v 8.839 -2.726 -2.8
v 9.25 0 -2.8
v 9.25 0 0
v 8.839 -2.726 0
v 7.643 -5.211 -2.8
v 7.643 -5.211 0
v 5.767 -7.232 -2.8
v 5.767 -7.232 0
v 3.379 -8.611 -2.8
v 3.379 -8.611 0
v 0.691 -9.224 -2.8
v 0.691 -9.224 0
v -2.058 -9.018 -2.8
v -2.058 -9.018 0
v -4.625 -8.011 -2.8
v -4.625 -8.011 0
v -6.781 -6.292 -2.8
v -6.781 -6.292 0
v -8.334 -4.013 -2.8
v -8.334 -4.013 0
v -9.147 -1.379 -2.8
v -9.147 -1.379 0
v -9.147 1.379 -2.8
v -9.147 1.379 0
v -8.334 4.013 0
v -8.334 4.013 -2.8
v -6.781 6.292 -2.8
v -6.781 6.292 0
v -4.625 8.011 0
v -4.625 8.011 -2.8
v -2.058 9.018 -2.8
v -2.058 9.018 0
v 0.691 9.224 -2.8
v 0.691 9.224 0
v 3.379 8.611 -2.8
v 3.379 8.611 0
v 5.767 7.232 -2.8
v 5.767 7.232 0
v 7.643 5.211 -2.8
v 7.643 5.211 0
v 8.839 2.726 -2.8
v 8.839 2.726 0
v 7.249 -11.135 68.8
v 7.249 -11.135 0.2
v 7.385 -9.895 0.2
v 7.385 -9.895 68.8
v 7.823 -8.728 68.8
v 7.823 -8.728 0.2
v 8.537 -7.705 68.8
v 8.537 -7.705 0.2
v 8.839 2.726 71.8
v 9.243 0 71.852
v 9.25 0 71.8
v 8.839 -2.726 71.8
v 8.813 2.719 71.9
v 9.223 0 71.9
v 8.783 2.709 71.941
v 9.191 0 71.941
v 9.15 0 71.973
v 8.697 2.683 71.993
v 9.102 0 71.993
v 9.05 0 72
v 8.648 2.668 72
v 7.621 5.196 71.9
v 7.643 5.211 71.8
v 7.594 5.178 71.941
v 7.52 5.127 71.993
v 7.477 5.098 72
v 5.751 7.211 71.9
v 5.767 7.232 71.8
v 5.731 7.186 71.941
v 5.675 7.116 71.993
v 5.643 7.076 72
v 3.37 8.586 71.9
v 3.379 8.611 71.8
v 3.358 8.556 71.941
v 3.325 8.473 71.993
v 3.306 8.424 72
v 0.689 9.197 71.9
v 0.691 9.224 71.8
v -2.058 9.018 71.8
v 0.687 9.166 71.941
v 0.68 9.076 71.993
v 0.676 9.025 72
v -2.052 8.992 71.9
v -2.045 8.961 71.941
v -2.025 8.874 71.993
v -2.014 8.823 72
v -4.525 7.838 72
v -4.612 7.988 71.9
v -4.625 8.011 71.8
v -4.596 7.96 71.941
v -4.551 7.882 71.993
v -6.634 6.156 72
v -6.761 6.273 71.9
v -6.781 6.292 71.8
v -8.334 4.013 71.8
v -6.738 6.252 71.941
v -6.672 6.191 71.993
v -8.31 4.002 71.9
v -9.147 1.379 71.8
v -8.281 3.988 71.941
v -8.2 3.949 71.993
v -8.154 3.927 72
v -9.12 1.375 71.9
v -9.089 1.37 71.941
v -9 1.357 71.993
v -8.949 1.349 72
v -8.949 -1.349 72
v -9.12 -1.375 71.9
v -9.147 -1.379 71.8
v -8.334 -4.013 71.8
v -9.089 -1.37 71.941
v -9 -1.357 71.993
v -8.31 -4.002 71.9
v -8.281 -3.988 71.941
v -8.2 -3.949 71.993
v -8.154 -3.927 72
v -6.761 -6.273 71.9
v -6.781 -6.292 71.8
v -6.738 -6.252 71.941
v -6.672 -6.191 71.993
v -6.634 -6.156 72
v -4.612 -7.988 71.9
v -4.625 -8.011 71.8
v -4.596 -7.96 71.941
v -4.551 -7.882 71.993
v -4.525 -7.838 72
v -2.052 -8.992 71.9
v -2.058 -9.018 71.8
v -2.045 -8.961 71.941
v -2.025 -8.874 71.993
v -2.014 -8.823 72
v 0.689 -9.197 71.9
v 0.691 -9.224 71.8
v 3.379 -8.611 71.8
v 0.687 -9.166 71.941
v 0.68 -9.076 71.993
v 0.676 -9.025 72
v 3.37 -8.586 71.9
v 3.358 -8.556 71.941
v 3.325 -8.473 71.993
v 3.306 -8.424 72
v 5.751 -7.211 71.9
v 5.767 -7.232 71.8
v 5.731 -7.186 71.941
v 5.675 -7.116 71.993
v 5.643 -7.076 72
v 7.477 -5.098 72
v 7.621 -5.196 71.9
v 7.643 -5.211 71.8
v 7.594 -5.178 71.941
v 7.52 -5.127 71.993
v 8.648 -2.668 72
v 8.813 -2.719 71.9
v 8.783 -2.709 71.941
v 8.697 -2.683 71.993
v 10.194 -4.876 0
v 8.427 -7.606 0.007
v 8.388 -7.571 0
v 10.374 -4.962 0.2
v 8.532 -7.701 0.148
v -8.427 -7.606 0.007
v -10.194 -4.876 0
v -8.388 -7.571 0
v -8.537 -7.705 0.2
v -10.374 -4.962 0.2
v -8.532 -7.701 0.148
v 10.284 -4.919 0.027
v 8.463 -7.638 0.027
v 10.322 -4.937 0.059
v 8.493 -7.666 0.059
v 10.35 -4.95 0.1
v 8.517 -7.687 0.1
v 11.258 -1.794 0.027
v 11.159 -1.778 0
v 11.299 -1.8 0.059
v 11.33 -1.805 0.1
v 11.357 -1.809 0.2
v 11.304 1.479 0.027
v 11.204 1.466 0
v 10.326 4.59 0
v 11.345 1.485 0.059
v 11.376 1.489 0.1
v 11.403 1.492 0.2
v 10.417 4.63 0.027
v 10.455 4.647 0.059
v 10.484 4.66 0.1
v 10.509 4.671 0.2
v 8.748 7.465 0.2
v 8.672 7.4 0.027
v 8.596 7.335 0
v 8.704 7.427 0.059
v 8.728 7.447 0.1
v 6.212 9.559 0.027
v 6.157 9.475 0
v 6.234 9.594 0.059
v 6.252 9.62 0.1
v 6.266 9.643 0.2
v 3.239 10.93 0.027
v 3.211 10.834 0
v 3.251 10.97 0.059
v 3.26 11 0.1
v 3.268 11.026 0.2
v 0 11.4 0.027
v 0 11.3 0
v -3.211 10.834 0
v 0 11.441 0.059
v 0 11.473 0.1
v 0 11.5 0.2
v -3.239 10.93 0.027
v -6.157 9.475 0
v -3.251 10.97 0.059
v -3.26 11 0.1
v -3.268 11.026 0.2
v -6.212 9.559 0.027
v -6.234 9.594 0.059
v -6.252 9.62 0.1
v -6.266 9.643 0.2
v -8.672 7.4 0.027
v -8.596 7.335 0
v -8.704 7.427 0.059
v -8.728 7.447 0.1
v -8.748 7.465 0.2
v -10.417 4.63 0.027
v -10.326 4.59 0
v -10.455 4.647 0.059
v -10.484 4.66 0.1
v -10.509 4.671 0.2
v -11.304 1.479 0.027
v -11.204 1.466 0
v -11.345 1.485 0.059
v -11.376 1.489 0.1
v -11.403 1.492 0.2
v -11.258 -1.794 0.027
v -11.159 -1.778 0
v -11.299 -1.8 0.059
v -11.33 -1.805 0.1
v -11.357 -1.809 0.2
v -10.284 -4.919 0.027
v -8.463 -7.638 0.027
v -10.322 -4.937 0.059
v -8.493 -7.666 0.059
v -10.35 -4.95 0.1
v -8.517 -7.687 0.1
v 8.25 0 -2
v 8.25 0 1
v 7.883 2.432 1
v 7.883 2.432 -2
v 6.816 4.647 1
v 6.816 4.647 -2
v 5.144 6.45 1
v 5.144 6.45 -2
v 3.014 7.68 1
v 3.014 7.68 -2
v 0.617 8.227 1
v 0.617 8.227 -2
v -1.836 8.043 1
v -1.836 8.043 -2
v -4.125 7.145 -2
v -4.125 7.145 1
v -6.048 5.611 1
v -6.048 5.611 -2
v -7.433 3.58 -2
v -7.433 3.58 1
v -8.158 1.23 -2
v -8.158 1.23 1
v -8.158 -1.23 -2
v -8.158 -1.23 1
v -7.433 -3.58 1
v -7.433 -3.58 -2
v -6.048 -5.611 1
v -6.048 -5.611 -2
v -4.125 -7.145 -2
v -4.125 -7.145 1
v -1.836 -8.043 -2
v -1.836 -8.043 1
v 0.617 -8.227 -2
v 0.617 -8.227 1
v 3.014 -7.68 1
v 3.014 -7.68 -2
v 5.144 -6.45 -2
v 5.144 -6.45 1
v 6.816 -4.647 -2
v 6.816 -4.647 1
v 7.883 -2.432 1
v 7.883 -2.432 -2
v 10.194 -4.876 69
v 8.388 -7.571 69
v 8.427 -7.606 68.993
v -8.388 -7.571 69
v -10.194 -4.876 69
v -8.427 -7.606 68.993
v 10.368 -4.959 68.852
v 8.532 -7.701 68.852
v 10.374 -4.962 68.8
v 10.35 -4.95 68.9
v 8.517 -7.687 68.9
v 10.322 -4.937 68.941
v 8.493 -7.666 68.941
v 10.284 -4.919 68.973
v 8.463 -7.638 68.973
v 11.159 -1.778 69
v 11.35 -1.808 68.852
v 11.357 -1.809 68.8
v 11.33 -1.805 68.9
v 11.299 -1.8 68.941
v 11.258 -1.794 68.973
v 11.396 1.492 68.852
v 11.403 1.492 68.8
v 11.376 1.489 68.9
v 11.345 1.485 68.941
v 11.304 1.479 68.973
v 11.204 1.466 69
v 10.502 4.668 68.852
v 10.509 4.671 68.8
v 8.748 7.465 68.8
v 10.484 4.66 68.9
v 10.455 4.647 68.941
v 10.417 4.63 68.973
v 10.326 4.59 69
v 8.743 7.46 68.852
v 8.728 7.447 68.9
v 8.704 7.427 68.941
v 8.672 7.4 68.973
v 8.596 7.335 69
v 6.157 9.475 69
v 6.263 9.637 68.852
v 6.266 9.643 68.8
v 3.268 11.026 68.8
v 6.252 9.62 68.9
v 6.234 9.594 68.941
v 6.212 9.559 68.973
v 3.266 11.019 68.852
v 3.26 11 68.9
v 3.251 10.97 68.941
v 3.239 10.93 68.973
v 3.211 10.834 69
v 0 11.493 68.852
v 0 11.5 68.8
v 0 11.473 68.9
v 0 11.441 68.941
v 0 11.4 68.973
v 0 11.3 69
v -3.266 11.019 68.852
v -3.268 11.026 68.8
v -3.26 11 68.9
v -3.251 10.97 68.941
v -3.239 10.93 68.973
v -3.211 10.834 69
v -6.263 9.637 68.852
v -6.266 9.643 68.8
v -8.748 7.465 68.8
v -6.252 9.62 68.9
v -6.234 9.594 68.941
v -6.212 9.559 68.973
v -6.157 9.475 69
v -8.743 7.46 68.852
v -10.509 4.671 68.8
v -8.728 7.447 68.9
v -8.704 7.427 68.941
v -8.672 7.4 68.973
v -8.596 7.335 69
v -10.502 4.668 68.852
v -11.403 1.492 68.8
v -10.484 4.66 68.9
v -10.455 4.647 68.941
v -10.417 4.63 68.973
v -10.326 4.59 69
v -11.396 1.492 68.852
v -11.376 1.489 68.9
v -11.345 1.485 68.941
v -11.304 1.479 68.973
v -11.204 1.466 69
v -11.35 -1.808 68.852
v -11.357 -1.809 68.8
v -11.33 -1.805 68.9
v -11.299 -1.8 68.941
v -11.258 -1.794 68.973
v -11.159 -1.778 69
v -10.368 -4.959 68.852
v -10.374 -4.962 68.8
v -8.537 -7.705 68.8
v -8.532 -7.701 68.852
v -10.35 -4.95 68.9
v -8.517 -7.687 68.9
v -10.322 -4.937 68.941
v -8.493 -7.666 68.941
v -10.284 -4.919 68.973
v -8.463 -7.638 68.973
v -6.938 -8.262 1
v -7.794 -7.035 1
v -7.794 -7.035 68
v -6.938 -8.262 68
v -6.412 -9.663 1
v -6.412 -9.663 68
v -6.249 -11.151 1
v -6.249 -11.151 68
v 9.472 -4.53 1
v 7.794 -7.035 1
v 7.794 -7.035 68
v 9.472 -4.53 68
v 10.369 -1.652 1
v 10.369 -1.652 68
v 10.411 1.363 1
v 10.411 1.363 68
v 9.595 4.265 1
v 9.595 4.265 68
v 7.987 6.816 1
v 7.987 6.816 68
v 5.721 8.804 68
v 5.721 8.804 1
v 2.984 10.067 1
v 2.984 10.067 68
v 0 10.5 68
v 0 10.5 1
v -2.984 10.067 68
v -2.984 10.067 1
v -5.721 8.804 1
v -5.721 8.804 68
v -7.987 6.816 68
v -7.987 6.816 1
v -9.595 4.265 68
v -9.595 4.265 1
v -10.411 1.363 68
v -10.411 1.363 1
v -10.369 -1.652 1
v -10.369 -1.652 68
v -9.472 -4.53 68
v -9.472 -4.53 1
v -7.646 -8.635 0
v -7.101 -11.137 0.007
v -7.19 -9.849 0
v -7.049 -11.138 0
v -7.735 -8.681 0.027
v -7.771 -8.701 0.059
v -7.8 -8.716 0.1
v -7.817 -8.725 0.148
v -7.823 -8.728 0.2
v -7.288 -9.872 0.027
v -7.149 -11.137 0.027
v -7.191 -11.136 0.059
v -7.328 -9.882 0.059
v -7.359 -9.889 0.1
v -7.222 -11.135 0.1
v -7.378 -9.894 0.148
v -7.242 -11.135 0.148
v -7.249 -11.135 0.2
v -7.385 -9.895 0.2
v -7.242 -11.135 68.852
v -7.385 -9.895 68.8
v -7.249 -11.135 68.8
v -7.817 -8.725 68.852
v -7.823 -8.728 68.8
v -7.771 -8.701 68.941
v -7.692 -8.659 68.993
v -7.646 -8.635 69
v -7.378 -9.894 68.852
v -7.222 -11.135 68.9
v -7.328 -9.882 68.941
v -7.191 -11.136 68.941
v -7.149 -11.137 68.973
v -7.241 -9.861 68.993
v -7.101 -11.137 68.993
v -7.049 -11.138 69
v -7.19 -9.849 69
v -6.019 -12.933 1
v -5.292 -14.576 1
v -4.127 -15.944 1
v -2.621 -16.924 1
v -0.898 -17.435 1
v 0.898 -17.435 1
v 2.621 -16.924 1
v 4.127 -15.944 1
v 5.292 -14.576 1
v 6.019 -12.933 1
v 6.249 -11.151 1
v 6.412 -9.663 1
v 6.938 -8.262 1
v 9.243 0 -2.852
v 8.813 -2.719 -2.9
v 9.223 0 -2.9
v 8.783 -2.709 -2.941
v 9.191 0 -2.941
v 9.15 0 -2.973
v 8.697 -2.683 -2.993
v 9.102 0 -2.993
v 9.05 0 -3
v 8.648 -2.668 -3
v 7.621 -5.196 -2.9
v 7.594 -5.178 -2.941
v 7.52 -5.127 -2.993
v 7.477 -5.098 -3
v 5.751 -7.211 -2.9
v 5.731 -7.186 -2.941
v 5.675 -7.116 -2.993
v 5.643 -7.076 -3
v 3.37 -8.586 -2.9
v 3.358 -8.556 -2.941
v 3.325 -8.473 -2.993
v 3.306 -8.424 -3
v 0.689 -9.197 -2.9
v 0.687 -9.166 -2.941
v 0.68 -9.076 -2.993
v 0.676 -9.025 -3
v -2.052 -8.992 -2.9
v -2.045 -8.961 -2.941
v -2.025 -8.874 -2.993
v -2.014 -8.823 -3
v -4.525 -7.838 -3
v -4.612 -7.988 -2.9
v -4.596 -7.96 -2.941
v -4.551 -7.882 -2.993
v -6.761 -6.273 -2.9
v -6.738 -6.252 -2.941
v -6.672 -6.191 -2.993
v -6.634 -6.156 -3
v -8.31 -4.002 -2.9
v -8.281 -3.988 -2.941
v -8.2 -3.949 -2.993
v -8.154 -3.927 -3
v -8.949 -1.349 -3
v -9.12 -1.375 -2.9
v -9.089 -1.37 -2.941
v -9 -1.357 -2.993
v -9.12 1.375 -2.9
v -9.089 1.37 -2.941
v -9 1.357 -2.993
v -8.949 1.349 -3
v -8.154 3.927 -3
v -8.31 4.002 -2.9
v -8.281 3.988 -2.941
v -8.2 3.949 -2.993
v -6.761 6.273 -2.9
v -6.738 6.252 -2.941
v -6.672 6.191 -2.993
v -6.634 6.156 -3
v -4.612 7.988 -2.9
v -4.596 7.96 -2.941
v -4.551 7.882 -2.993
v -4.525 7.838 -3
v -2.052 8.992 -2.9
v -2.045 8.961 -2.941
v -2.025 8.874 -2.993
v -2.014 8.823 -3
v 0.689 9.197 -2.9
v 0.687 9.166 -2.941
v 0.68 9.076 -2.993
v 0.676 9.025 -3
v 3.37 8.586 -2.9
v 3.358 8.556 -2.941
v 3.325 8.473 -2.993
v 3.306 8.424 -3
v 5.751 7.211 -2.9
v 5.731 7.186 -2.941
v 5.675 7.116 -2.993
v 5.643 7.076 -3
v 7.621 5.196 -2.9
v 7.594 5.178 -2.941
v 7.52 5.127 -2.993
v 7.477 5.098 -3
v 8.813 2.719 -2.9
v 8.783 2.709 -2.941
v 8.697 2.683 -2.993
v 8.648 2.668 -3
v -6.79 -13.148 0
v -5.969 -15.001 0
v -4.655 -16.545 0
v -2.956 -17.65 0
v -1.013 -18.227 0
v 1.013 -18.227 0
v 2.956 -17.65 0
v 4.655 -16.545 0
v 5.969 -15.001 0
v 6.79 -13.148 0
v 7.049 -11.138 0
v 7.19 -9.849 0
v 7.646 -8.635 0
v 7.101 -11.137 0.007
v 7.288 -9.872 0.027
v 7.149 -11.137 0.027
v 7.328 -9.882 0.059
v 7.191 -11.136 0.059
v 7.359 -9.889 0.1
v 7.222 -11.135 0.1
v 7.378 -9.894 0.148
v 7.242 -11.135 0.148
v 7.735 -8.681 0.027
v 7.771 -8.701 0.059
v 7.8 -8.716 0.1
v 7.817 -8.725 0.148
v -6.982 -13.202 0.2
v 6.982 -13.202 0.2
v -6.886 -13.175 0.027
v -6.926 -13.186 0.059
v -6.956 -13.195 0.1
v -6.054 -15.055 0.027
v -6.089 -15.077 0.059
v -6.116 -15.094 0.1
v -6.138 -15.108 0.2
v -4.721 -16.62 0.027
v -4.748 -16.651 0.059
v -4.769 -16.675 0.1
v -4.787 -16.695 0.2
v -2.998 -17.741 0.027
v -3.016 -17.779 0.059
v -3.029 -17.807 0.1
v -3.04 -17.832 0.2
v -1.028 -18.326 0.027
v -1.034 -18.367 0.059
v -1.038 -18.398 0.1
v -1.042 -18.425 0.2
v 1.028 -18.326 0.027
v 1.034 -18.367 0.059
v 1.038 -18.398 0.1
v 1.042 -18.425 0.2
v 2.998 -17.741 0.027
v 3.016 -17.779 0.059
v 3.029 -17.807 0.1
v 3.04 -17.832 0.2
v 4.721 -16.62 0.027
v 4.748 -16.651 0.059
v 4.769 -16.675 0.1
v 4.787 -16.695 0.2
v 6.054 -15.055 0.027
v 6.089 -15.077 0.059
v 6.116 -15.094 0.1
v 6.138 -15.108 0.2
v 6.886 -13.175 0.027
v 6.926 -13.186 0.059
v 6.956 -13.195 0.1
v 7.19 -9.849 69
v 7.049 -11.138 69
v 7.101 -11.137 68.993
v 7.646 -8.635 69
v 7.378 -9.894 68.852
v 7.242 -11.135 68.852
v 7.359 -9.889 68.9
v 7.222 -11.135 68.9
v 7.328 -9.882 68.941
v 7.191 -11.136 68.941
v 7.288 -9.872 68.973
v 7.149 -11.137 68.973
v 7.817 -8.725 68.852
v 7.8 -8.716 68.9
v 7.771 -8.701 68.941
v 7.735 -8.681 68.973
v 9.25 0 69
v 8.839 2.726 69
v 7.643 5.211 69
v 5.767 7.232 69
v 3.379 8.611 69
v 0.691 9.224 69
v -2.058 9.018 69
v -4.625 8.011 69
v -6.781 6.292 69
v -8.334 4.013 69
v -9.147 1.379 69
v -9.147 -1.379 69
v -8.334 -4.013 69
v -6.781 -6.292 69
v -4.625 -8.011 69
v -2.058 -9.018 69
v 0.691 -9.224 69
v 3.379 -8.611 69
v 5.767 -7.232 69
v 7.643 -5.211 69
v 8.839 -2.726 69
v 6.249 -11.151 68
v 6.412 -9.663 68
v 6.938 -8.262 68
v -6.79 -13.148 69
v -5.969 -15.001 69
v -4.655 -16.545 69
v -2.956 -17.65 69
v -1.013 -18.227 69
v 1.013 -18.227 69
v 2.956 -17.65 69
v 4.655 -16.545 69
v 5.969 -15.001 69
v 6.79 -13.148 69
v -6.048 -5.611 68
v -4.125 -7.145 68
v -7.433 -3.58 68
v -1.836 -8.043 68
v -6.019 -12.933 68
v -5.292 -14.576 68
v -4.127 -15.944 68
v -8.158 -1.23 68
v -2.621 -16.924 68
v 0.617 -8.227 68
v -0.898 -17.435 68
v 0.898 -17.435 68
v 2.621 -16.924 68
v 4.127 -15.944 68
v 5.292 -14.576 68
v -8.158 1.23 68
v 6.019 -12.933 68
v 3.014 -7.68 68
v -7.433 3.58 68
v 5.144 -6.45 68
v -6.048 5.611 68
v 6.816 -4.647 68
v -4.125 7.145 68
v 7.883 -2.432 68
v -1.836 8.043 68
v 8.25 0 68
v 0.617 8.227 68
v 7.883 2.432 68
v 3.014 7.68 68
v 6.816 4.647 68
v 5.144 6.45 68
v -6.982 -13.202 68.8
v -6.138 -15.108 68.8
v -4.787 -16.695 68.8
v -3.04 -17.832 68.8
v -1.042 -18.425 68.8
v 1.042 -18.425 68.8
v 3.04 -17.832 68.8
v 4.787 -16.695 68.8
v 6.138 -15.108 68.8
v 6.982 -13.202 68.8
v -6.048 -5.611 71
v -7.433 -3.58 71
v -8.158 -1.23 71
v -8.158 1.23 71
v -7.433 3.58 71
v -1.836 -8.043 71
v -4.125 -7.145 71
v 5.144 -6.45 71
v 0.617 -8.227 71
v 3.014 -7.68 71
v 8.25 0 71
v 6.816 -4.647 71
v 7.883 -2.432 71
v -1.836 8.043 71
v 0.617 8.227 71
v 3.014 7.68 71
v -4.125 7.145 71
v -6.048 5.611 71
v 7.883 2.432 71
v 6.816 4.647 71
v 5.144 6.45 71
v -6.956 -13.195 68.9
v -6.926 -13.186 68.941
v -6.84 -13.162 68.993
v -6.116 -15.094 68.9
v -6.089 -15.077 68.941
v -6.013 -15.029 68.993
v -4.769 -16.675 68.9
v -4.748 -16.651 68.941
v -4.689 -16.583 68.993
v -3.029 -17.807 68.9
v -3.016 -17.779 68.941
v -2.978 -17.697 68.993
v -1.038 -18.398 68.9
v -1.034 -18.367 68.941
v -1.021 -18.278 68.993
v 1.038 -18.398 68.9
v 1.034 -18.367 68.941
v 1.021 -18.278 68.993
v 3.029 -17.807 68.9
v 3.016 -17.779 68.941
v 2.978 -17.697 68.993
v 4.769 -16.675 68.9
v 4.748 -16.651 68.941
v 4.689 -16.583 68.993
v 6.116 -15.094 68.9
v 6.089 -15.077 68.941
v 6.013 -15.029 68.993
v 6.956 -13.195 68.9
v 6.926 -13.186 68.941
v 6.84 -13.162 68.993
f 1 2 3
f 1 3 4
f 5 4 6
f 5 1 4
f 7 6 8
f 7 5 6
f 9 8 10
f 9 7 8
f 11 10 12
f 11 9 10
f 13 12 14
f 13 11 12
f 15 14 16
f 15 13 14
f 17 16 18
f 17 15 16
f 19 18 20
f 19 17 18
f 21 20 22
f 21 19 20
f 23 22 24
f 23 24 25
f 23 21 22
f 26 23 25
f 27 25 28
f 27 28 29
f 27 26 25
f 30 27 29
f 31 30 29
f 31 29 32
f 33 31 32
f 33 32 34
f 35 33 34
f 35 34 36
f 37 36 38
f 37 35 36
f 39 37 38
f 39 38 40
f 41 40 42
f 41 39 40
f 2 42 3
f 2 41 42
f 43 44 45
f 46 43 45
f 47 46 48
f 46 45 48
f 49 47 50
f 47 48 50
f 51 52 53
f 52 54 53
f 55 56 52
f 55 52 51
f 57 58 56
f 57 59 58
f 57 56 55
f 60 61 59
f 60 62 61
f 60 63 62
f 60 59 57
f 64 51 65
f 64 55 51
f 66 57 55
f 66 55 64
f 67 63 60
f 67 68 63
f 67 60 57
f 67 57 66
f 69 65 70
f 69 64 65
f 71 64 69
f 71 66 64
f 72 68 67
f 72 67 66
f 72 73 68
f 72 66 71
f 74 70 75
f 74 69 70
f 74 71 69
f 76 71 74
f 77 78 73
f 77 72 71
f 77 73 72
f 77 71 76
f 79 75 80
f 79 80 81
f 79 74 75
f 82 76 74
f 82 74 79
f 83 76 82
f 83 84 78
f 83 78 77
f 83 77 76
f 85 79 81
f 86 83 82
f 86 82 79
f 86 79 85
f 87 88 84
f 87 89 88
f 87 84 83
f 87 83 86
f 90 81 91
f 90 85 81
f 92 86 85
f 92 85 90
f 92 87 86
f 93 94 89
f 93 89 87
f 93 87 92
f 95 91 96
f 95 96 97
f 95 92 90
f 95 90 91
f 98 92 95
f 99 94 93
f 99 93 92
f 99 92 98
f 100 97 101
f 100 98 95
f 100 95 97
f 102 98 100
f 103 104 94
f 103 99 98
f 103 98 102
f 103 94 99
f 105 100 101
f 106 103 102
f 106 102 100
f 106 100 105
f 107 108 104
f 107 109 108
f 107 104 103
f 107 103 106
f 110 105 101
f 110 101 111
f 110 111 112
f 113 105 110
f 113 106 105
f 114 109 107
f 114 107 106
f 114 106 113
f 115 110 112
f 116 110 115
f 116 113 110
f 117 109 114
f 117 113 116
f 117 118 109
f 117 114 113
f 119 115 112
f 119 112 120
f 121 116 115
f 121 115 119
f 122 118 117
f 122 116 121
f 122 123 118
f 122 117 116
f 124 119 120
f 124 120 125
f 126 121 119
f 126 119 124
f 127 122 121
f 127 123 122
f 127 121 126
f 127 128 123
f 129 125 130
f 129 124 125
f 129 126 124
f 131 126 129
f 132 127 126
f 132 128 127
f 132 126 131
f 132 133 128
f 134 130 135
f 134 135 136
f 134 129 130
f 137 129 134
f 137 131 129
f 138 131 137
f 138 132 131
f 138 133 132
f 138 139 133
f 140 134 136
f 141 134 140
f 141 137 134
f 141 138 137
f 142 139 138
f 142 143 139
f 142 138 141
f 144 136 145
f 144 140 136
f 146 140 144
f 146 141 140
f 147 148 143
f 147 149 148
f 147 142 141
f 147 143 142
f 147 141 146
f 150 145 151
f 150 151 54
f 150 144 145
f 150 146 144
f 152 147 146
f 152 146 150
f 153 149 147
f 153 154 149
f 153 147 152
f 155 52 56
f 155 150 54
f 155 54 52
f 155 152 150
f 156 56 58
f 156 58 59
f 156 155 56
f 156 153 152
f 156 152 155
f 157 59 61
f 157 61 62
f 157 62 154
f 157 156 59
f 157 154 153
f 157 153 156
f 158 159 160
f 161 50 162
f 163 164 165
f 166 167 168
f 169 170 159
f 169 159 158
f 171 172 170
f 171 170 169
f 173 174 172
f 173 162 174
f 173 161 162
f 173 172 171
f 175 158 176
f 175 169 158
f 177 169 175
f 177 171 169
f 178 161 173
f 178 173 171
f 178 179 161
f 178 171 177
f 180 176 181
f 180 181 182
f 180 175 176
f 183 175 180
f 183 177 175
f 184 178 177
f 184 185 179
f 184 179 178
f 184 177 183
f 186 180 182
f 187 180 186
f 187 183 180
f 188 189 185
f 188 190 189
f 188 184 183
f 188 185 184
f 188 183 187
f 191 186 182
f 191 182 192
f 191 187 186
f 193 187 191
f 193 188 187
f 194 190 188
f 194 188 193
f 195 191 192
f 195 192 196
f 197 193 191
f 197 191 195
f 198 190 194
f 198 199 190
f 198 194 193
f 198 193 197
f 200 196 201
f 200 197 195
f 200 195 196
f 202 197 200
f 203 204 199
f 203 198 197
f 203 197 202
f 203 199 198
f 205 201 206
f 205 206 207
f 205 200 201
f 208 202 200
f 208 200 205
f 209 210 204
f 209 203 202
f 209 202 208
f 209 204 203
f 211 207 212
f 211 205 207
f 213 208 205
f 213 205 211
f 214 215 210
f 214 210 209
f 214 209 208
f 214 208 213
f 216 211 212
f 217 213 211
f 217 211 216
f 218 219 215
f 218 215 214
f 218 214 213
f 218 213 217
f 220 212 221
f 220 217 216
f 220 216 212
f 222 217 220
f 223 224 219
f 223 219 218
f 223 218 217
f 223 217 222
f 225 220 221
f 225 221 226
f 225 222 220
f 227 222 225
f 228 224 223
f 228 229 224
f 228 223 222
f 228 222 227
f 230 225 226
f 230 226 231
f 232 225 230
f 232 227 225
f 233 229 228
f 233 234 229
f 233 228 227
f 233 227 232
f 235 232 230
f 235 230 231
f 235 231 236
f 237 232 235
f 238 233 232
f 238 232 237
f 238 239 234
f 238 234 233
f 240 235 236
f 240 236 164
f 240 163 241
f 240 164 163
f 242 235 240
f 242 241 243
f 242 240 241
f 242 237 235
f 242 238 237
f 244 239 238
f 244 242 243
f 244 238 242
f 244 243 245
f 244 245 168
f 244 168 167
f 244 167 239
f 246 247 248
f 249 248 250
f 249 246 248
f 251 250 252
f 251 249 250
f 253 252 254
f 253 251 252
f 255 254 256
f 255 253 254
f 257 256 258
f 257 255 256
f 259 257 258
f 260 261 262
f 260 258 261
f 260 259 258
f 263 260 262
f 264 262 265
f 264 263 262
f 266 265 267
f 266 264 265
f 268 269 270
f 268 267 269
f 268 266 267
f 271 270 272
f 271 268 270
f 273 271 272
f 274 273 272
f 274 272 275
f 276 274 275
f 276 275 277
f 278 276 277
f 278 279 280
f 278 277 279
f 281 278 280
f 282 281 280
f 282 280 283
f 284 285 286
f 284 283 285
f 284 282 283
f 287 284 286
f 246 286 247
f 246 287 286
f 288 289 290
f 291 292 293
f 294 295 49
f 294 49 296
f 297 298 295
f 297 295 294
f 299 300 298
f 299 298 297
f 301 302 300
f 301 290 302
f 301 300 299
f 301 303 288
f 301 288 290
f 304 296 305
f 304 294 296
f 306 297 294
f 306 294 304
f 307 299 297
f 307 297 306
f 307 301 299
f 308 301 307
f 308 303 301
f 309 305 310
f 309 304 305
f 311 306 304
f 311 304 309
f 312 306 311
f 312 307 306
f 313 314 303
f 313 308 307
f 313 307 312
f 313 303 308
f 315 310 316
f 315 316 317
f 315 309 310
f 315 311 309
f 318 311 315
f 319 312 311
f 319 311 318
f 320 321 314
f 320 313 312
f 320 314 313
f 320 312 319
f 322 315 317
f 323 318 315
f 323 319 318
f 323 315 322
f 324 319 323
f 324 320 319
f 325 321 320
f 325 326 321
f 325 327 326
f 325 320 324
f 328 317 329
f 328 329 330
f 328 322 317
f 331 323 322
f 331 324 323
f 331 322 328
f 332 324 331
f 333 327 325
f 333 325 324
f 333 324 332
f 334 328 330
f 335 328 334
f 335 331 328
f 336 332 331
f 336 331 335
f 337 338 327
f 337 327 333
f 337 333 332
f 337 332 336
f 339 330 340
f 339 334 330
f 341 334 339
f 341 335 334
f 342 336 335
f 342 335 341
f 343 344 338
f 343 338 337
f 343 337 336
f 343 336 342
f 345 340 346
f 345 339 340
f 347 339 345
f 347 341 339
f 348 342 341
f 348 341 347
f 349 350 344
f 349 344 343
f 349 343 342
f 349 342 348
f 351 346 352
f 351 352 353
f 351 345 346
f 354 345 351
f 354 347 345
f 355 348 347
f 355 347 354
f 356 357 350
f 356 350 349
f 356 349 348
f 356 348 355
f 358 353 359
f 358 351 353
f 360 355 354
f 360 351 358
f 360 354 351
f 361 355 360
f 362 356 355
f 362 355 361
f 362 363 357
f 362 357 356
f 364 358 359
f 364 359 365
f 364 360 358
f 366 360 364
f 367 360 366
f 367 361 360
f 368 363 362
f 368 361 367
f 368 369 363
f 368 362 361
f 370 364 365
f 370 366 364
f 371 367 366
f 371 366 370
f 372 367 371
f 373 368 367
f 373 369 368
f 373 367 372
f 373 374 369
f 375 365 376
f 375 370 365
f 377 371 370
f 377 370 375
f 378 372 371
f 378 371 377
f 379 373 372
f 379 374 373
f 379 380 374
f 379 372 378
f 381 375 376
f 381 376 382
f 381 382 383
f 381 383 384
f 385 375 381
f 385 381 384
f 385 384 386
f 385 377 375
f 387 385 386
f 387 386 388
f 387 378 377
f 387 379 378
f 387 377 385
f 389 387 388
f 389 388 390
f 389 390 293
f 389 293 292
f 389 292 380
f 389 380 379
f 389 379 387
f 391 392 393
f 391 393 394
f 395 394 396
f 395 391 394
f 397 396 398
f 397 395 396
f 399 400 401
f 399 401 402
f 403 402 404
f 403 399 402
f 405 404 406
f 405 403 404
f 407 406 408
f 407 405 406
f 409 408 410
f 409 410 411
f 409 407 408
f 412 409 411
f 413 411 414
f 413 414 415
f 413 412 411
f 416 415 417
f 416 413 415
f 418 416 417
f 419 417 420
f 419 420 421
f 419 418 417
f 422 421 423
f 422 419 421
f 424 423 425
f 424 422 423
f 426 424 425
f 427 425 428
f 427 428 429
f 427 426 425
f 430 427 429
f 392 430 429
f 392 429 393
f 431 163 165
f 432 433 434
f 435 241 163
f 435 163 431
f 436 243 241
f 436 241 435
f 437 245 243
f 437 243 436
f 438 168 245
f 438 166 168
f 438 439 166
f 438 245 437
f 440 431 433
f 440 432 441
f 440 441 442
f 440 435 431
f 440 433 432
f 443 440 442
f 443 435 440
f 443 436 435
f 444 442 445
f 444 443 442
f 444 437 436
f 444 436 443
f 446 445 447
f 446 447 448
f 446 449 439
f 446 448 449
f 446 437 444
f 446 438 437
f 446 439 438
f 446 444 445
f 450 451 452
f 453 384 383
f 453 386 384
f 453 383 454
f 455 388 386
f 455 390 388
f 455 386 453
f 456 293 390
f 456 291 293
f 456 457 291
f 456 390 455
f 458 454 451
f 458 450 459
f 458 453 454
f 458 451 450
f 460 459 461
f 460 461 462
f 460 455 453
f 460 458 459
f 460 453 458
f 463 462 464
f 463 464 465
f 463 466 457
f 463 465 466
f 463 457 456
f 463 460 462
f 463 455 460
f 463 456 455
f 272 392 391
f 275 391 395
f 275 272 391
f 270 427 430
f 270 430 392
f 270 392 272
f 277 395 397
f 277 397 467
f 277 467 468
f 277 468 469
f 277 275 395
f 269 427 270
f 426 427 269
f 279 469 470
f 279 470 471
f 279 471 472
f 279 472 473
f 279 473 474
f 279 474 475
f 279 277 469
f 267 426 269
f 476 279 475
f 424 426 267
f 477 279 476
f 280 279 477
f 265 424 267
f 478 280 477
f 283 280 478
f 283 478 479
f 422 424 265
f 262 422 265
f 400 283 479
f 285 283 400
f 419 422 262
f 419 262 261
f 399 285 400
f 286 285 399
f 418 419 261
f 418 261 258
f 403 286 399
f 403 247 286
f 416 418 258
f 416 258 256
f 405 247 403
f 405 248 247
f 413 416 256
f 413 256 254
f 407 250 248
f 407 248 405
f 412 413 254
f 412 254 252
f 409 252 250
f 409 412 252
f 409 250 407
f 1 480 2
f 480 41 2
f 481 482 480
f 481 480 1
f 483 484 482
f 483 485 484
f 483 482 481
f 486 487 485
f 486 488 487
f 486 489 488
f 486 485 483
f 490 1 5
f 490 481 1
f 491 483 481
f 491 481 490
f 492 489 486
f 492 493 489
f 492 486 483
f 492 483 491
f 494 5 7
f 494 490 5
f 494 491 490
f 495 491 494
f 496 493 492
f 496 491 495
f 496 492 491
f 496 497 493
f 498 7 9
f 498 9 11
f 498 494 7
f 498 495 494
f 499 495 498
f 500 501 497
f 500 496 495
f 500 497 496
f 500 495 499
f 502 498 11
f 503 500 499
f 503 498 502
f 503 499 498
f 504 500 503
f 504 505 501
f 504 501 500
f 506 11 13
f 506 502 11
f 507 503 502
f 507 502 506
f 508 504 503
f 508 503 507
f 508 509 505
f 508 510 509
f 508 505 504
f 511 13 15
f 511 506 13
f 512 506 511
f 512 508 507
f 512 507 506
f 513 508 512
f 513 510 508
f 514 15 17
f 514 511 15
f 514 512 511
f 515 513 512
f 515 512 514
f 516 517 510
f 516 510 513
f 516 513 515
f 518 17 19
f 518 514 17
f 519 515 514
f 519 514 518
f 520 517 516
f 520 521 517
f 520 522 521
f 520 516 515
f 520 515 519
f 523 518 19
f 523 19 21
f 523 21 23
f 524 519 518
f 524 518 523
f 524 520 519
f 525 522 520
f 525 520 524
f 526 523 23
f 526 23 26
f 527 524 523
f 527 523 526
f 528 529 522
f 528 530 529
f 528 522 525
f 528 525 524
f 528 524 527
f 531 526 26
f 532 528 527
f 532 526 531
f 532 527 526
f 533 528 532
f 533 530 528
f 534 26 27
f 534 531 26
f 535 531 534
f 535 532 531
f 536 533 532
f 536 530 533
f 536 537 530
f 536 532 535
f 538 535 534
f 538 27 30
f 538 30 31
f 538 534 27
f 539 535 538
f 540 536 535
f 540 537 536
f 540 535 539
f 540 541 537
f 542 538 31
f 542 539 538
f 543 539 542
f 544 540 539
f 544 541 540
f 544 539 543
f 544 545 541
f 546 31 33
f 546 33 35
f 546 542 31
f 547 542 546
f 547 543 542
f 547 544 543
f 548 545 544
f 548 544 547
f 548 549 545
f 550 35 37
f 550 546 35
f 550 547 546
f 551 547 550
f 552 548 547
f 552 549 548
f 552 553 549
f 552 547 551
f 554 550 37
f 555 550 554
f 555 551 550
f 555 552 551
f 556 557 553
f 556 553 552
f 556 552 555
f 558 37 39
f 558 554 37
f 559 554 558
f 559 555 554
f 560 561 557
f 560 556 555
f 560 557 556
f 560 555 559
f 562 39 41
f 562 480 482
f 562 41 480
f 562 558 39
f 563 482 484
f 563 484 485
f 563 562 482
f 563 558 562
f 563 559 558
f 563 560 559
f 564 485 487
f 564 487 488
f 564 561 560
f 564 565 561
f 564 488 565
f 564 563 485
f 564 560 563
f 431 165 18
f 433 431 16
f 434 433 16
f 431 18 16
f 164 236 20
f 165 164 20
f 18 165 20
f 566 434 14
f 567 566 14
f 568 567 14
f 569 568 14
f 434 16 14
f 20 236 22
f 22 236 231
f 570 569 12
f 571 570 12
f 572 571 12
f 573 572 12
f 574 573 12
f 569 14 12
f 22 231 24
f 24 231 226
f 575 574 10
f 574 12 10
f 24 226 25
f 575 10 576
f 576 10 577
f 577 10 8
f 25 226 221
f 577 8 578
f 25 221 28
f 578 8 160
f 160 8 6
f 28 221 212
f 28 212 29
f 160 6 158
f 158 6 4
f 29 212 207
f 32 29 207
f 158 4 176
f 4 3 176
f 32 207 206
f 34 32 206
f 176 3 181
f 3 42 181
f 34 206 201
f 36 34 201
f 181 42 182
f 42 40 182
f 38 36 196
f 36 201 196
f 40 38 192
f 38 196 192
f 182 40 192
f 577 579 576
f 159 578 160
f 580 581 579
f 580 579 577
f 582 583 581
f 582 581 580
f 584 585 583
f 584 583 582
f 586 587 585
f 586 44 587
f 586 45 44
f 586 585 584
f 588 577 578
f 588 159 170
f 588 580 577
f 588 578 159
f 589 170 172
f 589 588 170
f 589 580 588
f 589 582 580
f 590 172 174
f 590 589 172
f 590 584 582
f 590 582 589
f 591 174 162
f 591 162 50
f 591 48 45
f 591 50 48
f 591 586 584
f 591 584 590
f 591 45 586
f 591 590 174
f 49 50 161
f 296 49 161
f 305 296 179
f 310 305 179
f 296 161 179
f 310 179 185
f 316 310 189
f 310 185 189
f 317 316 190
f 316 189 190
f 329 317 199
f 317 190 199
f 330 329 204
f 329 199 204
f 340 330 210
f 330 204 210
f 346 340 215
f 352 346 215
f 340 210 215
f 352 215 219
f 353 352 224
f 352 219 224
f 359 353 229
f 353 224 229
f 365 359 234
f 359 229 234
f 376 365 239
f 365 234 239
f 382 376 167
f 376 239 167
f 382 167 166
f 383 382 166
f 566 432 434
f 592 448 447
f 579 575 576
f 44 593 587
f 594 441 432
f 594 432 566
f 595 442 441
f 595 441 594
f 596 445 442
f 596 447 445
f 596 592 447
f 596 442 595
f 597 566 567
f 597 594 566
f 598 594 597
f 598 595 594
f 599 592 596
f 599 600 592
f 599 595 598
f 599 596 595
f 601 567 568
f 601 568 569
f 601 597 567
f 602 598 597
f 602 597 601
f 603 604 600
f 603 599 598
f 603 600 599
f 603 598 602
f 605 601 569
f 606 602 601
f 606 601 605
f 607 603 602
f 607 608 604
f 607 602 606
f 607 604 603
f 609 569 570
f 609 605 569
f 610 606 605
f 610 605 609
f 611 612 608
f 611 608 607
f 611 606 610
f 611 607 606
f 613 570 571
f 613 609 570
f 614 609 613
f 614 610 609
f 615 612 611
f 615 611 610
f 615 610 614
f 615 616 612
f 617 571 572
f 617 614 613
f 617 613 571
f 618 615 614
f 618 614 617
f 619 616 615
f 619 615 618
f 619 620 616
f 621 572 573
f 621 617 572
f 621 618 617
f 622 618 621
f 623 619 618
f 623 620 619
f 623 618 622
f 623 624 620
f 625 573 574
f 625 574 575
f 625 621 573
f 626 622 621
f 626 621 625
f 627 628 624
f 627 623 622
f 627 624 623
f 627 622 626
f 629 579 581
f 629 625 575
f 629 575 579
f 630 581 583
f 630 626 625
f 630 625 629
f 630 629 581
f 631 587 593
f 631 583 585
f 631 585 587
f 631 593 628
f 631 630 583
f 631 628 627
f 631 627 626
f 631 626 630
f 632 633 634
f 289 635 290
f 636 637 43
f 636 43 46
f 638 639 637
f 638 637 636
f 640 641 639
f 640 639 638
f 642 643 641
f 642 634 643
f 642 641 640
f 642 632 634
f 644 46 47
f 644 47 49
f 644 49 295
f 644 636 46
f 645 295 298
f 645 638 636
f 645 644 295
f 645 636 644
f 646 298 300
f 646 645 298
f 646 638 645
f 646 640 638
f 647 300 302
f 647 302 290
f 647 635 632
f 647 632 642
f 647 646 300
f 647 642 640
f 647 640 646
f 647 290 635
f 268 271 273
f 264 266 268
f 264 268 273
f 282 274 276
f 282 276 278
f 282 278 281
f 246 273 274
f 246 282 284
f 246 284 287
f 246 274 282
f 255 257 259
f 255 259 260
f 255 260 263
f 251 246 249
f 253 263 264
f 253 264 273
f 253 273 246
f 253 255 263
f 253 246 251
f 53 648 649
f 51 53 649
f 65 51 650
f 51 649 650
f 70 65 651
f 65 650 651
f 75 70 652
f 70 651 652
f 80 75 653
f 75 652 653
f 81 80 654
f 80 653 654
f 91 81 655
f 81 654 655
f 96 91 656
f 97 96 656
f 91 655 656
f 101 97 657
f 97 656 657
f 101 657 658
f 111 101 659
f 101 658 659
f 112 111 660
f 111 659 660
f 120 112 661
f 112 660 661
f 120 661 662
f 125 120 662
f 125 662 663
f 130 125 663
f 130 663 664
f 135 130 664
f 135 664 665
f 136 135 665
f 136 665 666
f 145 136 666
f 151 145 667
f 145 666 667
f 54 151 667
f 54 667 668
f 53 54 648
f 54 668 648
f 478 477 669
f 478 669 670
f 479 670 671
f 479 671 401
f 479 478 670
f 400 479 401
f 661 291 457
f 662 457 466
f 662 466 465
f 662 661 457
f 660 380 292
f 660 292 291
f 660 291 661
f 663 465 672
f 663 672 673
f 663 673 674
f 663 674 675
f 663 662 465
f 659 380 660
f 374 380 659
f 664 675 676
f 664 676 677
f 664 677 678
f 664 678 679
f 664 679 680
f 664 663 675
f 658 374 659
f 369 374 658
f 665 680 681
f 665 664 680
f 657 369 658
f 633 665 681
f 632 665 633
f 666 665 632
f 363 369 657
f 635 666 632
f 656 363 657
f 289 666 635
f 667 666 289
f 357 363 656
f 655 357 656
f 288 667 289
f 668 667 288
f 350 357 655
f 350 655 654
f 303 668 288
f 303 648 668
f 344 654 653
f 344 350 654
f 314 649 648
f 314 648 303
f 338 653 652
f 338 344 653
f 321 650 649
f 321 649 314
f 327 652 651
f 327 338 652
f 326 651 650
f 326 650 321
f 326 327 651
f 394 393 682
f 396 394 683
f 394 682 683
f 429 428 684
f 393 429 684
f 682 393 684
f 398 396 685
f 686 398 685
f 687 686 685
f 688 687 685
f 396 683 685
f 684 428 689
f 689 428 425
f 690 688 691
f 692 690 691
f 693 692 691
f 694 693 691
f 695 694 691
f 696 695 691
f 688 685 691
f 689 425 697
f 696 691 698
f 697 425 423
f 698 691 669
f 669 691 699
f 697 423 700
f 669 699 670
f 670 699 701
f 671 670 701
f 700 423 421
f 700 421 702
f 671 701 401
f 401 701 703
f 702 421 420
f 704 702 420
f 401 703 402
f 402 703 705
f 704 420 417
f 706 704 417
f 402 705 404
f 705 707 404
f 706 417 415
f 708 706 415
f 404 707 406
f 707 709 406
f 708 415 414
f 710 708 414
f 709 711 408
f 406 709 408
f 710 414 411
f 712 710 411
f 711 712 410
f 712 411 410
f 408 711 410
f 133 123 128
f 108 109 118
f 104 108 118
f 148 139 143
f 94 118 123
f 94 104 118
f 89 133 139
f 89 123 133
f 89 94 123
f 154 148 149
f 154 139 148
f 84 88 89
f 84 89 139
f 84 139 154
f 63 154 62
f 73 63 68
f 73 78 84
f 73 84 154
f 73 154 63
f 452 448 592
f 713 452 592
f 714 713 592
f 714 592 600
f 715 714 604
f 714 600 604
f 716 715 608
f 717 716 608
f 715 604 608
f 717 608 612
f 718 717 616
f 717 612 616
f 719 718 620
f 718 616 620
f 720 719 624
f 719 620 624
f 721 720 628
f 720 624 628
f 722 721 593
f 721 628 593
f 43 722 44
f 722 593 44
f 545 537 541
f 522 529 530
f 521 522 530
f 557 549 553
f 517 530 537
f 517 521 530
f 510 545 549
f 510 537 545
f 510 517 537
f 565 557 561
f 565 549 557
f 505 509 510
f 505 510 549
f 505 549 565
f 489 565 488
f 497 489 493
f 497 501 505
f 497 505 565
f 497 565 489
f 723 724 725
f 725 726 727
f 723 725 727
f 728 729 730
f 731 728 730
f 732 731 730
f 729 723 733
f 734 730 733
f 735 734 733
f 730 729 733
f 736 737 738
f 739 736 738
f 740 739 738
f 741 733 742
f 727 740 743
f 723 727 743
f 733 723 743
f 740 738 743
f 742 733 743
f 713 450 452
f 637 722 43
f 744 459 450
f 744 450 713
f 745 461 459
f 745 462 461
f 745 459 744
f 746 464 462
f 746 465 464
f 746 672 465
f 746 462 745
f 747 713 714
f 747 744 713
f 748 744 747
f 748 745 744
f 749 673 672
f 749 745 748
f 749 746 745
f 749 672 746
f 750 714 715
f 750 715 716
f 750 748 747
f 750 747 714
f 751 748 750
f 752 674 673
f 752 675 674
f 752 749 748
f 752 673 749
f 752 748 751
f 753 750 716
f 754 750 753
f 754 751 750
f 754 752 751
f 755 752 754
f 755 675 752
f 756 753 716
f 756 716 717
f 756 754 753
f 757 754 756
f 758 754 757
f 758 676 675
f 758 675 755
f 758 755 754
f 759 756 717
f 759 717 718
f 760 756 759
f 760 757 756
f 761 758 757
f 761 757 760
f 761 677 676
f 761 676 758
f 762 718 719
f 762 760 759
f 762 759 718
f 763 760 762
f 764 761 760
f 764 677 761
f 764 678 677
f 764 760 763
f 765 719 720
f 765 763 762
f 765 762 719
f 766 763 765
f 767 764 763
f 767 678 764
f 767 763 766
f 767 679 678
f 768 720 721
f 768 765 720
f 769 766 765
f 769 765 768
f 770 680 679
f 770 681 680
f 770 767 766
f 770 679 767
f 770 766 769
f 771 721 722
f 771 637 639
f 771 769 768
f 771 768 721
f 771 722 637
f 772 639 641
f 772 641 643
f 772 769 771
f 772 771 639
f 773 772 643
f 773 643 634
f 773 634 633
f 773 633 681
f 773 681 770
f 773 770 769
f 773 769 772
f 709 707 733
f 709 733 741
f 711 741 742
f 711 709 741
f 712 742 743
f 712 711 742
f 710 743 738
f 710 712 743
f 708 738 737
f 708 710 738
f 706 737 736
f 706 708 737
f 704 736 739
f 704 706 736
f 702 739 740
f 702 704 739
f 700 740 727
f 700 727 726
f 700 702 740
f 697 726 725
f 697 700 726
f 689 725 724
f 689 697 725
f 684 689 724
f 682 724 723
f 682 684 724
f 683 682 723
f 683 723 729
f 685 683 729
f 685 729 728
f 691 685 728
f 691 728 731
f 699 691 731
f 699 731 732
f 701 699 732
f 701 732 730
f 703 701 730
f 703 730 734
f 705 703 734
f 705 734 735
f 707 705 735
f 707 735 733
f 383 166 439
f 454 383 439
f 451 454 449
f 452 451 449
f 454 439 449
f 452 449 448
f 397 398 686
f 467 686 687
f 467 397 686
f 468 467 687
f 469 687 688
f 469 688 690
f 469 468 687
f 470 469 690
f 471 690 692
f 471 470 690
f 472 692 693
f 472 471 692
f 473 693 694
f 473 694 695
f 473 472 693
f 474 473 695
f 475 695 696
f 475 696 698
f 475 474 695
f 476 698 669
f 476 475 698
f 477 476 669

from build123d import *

# Parameters (mm, degrees)
EXTRUSION1_DEPTH   = 69
ESQUISSE2_R        = 9.25
BOSS_EXTRU_1_DEPTH = 3
BOSS_EXTRU_2_START = 3
ESQUISSE3_R        = 9.25
BOSS_EXTRU_2_DEPTH = 3
CONG_1_R           = 0.2
COQUE2_START       = 1
COQUE2_DEPTH       = 67
COQUE2_START_2     = -2
COQUE2_2_OUTLINE_R = 8.25
COQUE2_2_DEPTH     = 73


# Read off the part's stored shape, not the designer's step: Coque2
with BuildPart() as part:
    # Esquisse1 → Extrusion1 (new body)
    with BuildSketch(Plane.XY):
        with BuildLine():
            ThreePointArc((-8.53680315, -7.705387205), (-7.567547804, -9.297974269), (-7.249086614, -11.134920635))
            ThreePointArc((-7.249086614, -11.134920635), (0, -18.5), (7.249086614, -11.134920635))
            ThreePointArc((7.249086614, -11.134920635), (7.567547804, -9.297974269), (8.53680315, -7.705387205))
            ThreePointArc((8.53680315, -7.705387205), (0, 11.5), (-8.53680315, -7.705387205))
        make_face()
    extrude(amount=EXTRUSION1_DEPTH)

    # Esquisse2 → Boss.-Extru.1 (add)
    with BuildSketch(Plane.XY.offset(69)):
        Circle(ESQUISSE2_R)
    extrude(amount=BOSS_EXTRU_1_DEPTH)

    # Esquisse3 → Boss.-Extru.2 (add)
    with BuildSketch(Plane(origin=(0, 0, 0), x_dir=(-1, 0, 0), z_dir=(0, 0, -1)).offset(BOSS_EXTRU_2_START)):
        with Locations(Location((0, 0, 0), (0, 0, 180))):
            Circle(ESQUISSE3_R)
    extrude(amount=-BOSS_EXTRU_2_DEPTH)

    # Congé1
    cong_1_edges = [part.edges().sort_by_distance(p)[0] for p in [
        (0, -18.5, 69),
        (7.567547804, -9.297974269, 69),
        (-9.25, 0, 72),
        (-9.25, 0, -3),
        (0, 11.5, 69),
        (7.567547804, -9.297974269, 0),
        (0, -18.5, 0),
        (-7.567547804, -9.297974269, 0),
        (0, 11.5, 0),
        (-7.567547804, -9.297974269, 69),
    ]]
    fillet(cong_1_edges, radius=CONG_1_R)

    # Coque2 outline → Coque2 (cut)
    with BuildSketch(Plane.XY.offset(COQUE2_START)):
        with BuildLine():
            ThreePointArc((7.794472441, -7.035353535), (0, 10.5), (-7.794472441, -7.035353535))
            ThreePointArc((-7.794472441, -7.035353535), (-6.631366027, -8.946458012), (-6.249212598, -11.150793651))
            ThreePointArc((-6.249212598, -11.150793651), (0, -17.5), (6.249212598, -11.150793651))
            ThreePointArc((6.249212598, -11.150793651), (6.631366027, -8.946458012), (7.794472441, -7.035353535))
        make_face()
    extrude(amount=COQUE2_DEPTH, mode=Mode.SUBTRACT)

    # Coque2 2 outline → Coque2 2 (cut)
    with BuildSketch(Plane.XY.offset(COQUE2_START_2)):
        Circle(COQUE2_2_OUTLINE_R)
    extrude(amount=COQUE2_2_DEPTH, mode=Mode.SUBTRACT)


solid = part.part
